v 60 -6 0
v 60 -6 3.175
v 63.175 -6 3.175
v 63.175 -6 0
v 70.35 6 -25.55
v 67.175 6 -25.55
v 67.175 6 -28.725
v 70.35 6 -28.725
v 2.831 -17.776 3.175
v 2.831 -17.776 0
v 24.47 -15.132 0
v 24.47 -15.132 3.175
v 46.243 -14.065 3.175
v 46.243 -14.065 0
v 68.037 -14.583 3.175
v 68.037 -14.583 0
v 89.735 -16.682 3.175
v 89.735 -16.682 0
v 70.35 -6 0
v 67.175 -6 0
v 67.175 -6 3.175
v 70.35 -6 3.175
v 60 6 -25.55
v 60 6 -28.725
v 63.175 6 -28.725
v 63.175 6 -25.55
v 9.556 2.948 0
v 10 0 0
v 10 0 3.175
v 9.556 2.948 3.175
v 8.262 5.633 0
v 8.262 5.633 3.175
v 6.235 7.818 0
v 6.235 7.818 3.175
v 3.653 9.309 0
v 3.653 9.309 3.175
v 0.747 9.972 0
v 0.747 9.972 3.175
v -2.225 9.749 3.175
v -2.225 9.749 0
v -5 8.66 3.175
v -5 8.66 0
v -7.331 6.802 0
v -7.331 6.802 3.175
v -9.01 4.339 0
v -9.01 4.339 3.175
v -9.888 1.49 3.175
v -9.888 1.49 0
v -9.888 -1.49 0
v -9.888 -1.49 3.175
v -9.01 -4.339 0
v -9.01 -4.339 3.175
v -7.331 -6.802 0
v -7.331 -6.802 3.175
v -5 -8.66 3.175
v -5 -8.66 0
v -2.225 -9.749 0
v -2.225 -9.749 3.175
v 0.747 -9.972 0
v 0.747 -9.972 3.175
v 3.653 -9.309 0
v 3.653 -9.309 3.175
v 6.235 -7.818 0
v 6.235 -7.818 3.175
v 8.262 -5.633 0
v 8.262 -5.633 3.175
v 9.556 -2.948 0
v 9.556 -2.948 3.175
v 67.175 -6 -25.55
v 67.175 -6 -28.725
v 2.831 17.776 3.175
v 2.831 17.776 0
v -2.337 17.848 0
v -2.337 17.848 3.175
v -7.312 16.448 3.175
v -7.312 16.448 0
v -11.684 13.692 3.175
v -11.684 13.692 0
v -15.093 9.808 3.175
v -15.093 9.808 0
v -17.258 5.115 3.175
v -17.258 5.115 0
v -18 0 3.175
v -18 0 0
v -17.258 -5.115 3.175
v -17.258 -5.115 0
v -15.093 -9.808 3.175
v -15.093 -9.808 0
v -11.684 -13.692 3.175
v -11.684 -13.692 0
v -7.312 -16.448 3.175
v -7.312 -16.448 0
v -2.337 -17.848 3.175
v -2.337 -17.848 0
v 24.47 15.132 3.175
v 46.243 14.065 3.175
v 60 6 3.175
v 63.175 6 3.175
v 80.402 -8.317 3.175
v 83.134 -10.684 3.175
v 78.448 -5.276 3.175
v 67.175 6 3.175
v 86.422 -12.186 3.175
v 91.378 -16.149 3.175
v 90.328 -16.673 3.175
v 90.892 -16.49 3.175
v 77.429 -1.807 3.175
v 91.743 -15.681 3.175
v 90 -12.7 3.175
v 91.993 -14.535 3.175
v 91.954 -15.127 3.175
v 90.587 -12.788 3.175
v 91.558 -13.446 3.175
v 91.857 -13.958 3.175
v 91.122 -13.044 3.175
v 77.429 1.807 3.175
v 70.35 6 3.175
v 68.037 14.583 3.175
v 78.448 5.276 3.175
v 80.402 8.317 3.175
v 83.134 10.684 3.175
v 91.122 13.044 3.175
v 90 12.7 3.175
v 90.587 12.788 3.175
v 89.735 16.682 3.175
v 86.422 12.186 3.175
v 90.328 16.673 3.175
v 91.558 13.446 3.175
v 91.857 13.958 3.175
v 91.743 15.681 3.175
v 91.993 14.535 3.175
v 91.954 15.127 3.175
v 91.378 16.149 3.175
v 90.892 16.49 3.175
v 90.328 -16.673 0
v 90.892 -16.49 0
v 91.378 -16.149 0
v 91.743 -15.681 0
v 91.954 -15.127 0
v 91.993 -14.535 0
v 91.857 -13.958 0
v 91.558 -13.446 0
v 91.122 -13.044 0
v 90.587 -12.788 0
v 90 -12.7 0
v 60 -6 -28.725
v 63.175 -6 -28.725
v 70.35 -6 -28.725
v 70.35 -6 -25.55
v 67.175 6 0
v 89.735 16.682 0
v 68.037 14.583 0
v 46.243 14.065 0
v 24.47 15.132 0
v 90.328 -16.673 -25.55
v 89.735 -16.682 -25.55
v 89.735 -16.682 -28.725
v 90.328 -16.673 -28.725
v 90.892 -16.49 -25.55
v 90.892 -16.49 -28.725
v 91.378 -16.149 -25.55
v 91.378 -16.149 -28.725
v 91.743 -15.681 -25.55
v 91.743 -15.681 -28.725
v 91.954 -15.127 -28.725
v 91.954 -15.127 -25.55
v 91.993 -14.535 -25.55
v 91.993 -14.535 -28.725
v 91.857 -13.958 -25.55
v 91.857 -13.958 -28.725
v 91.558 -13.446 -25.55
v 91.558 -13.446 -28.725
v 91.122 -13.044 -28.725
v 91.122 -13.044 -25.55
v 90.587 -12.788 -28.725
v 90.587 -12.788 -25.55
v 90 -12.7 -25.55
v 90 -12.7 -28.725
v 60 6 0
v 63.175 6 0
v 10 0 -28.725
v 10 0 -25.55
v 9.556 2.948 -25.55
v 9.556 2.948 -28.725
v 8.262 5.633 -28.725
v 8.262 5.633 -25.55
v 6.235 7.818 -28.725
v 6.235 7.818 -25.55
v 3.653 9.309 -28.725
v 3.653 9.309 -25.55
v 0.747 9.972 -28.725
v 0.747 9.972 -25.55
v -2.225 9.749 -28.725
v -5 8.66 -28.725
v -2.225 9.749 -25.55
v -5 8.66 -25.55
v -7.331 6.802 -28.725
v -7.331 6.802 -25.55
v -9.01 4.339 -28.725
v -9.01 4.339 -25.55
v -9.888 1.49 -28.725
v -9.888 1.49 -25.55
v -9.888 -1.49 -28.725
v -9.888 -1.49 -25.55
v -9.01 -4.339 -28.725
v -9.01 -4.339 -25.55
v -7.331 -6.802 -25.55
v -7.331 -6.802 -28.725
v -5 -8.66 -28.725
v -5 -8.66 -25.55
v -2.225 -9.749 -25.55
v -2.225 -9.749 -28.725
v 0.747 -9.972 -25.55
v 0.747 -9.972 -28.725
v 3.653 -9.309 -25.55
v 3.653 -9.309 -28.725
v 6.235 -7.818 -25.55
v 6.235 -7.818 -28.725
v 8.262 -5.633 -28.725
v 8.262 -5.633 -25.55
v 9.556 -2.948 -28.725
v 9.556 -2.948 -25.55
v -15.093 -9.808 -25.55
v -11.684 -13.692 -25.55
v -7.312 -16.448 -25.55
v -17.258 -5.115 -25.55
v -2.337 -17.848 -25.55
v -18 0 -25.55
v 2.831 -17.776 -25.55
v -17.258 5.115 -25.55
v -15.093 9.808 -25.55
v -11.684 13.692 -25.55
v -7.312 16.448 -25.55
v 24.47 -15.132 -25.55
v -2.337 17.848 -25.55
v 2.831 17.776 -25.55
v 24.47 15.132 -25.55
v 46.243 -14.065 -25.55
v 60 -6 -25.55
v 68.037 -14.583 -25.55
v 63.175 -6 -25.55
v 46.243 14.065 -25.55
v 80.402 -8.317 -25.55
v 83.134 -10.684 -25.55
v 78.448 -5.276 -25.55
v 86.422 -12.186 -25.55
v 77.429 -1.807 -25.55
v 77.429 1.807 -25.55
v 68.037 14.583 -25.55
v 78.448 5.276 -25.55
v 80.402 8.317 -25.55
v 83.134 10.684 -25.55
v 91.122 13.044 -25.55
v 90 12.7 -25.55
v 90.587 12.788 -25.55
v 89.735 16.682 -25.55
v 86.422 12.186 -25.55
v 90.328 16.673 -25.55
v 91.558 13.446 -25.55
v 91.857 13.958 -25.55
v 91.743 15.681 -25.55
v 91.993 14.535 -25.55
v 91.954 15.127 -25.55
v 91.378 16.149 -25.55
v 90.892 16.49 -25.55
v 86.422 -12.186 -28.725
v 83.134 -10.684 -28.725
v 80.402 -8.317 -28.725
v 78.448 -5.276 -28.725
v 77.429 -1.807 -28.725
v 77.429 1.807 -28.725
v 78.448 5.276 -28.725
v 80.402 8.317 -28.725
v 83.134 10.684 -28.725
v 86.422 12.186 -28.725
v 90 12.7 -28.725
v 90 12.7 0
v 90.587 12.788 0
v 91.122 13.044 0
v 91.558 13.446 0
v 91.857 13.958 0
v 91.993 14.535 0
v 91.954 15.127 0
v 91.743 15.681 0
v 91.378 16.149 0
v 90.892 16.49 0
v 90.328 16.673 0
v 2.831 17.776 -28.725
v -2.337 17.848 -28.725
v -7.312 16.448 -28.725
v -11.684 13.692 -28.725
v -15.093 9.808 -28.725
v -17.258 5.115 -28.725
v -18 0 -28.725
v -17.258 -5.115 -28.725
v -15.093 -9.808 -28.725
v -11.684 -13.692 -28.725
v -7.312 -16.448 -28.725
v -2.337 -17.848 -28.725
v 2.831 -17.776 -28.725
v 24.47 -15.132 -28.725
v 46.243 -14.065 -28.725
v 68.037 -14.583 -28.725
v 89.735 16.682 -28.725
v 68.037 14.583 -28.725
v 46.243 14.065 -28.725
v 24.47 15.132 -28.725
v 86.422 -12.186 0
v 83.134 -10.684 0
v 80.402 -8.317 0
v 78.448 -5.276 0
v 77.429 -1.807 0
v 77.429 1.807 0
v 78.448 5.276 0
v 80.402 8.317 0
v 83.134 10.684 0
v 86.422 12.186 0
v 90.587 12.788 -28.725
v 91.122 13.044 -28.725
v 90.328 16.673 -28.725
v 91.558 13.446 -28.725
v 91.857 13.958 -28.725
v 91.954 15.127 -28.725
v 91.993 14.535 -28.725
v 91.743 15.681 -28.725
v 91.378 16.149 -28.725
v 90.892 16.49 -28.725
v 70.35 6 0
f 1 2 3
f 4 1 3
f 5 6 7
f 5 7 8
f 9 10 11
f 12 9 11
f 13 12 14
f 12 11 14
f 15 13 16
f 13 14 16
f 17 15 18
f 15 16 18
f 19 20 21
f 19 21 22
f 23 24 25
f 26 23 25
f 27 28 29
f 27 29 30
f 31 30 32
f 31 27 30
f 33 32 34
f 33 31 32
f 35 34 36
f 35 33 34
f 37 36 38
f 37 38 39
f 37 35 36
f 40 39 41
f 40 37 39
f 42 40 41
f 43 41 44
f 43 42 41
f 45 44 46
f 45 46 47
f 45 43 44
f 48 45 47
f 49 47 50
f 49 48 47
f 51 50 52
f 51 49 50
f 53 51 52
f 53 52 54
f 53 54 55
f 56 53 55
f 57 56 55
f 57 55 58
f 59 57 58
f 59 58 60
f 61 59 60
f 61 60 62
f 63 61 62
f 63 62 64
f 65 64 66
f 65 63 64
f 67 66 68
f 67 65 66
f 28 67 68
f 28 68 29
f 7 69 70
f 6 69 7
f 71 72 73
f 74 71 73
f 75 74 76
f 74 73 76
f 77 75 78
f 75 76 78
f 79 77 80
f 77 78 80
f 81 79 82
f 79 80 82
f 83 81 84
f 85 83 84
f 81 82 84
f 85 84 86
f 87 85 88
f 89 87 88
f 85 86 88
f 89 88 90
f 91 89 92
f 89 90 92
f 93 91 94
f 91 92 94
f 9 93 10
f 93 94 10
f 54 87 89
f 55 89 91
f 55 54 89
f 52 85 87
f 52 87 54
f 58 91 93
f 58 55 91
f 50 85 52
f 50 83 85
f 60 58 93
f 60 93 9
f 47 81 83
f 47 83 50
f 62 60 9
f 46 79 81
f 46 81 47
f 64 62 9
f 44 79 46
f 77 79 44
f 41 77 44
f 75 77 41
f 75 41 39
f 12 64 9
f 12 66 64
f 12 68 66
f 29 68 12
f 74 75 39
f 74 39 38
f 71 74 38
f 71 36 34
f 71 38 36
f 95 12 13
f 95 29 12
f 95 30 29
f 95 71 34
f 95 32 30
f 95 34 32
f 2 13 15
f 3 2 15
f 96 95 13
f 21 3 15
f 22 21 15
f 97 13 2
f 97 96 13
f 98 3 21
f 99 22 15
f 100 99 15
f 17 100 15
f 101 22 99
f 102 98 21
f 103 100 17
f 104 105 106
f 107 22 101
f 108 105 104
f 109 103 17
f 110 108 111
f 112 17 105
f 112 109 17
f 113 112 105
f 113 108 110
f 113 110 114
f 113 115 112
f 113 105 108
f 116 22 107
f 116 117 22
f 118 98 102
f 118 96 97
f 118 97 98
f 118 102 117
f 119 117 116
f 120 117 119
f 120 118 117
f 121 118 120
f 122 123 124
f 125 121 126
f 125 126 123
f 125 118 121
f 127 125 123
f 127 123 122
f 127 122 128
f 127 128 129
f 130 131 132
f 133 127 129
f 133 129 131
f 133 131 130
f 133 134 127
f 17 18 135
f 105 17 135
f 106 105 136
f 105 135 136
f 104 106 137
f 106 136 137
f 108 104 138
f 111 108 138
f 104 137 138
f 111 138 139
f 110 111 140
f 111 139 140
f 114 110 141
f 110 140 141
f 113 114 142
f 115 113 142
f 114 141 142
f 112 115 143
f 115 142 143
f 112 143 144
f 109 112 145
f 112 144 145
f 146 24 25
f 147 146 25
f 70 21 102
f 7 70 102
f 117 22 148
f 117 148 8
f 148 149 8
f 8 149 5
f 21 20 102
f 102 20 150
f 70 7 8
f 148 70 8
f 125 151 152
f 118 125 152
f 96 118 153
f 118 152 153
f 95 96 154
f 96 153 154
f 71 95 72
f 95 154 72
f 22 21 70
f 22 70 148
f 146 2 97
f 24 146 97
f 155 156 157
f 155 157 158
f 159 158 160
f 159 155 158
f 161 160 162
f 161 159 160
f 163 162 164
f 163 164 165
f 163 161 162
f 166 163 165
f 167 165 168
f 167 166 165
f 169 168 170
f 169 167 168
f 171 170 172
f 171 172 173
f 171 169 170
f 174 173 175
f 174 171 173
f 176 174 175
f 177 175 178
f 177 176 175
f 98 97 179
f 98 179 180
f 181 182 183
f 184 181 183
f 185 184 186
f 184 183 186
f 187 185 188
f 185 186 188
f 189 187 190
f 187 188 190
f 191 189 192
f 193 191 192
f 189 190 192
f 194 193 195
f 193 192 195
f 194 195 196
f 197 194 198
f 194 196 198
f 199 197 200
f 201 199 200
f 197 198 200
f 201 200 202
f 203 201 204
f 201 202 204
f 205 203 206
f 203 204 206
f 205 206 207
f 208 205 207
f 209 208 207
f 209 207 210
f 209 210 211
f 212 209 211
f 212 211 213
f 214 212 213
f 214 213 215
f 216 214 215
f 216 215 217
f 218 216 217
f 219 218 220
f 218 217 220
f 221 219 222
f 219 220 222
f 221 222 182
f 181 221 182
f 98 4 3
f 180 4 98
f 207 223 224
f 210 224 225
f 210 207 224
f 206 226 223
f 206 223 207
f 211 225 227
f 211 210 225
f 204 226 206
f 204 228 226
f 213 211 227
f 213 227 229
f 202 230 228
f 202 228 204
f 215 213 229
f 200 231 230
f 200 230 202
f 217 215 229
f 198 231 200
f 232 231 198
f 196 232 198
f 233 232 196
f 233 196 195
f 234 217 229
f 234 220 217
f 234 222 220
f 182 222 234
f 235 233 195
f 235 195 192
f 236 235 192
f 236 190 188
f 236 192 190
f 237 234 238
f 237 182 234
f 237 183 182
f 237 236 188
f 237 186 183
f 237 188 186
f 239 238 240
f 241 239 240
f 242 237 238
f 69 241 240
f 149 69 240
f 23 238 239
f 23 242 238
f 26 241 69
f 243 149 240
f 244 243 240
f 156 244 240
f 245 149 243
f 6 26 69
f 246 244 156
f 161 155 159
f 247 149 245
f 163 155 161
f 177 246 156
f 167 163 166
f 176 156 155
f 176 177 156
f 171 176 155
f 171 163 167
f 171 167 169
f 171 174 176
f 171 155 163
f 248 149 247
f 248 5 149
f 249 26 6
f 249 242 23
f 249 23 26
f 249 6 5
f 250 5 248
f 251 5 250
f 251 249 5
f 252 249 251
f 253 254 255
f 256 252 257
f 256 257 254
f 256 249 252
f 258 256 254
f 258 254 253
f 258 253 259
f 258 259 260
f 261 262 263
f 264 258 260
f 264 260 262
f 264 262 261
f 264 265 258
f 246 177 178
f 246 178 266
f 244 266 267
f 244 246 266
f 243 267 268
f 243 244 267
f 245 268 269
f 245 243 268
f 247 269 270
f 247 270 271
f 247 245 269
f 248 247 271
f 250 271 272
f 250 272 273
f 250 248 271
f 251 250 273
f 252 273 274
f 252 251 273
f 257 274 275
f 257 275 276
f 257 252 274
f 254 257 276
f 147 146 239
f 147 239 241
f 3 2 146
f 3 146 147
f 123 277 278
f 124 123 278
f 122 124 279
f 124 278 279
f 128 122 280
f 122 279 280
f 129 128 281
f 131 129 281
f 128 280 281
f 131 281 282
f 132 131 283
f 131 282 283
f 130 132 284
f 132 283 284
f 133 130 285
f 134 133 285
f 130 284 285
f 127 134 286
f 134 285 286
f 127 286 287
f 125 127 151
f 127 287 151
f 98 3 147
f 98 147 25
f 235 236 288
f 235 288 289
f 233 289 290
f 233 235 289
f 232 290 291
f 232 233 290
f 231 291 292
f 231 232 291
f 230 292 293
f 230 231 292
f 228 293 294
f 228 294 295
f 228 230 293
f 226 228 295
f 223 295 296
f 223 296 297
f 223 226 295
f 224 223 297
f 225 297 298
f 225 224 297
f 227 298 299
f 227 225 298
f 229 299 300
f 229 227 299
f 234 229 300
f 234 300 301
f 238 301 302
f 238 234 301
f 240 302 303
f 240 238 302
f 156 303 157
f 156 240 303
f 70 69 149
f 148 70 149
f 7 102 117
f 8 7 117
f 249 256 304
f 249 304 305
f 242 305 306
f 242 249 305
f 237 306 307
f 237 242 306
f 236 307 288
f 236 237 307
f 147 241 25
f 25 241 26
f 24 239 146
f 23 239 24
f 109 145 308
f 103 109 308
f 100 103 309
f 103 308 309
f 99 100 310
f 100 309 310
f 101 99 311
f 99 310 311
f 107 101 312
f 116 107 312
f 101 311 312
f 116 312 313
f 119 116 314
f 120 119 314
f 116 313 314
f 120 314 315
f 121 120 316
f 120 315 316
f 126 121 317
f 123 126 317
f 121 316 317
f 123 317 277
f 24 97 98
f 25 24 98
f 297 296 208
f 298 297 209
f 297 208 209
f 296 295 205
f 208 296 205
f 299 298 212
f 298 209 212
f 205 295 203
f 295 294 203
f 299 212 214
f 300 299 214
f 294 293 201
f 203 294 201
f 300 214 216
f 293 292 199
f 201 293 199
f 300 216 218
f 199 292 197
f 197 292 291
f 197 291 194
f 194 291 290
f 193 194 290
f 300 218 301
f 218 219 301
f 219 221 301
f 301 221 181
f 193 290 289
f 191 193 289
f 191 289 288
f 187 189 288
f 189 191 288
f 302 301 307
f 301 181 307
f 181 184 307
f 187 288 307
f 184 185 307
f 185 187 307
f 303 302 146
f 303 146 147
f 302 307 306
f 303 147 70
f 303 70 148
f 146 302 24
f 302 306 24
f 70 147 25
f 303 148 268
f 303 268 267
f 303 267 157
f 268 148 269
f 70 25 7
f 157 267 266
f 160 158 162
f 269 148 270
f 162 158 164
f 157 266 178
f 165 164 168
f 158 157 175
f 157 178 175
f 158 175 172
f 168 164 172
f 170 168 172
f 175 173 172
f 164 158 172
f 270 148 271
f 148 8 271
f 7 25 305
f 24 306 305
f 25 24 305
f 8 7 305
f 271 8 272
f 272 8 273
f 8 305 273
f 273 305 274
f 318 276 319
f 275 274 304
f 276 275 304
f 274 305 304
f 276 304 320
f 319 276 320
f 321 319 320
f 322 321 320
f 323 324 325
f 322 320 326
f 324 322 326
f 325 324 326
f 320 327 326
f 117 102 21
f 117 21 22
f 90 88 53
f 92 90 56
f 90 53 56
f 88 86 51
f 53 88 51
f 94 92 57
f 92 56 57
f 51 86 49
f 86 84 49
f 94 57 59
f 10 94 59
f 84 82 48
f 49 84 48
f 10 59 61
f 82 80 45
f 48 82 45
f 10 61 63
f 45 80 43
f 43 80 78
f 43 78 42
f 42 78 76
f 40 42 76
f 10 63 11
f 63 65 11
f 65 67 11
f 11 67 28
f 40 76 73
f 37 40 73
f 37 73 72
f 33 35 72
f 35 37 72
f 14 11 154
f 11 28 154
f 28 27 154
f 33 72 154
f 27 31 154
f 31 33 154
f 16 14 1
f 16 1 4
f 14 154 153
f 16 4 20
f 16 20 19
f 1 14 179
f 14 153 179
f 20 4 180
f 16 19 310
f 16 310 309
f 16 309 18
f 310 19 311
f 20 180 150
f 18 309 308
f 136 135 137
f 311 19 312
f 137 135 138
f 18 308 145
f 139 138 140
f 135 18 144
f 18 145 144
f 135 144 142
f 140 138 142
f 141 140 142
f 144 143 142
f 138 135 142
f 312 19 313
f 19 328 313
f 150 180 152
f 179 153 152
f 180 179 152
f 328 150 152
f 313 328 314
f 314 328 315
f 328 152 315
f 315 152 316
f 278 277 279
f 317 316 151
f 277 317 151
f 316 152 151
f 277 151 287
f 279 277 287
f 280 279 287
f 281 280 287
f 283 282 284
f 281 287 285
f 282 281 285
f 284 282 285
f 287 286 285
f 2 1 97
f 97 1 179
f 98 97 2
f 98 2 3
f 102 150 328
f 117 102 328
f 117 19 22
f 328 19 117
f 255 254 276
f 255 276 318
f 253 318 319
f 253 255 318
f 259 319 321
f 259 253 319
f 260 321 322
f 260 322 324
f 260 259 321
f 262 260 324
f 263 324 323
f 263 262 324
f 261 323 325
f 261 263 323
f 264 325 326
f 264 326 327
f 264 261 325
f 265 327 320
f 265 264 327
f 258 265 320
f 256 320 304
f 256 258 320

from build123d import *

# Parameters (mm, degrees)
SKETCH1_R             = 10
SKETCH1_W             = 3.175
SKETCH1_H             = 12
BOSS_EXTRUDE1_DEPTH   = 3.175
SKETCH2_W             = 3.175
SKETCH2_H             = 12
BOSS_EXTRUDE2_DEPTH   = 31.9
BOSS_EXTRUDE2_2_DEPTH = 31.9


with BuildPart() as part:
    # Sketch1 → Boss-Extrude1 (new body)
    with BuildSketch(Plane.XY):
        with BuildLine():
            ThreePointArc((2.831215146, 17.775945004), (-18, 0), (2.831215146, -17.775945004))
            ThreePointArc((2.831215146, -17.775945004), (46.243406786, -14.065443628), (89.735219432, -16.682395332))
            ThreePointArc((89.735219432, -16.682395332), (91.99559398, -14.832682585), (90, -12.7))
            ThreePointArc((90, -12.7), (77.3, 0), (90, 12.7))
            ThreePointArc((90, 12.7), (91.99559398, 14.832682585), (89.735219432, 16.682395332))
            ThreePointArc((89.735219432, 16.682395332), (46.243406786, 14.065443628), (2.831215146, 17.775945004))
        make_face()
        Circle(SKETCH1_R, mode=Mode.SUBTRACT)
        with Locations((68.7625, 0)):
            Rectangle(SKETCH1_W, SKETCH1_H, mode=Mode.SUBTRACT)
        with Locations((61.5875, 0)):
            Rectangle(SKETCH1_W, SKETCH1_H, mode=Mode.SUBTRACT)
    extrude(amount=BOSS_EXTRUDE1_DEPTH)


with BuildPart() as body_2:
    # Mirror3: mirrored copy
    add(part.part.mirror(Plane(origin=(0, 0, -12.775), x_dir=(1, 0, 0), z_dir=(0, 0, -1))))


with BuildPart() as body_3:
    # Sketch2 → Boss-Extrude2 (new body)
    with BuildSketch(Plane.XY.offset(3.175)):
        with Locations((61.5875, 0)):
            Rectangle(SKETCH2_W, SKETCH2_H)
    extrude(amount=-BOSS_EXTRUDE2_DEPTH)


with BuildPart() as body_4:
    # Sketch2 → Boss-Extrude2 2 (new body)
    with BuildSketch(Plane.XY.offset(3.175)):
        with Locations((68.7625, 0)):
            Rectangle(SKETCH2_W, SKETCH2_H)
    extrude(amount=-BOSS_EXTRUDE2_2_DEPTH)


solid = Compound([part.part, body_2.part, body_3.part, body_4.part])
